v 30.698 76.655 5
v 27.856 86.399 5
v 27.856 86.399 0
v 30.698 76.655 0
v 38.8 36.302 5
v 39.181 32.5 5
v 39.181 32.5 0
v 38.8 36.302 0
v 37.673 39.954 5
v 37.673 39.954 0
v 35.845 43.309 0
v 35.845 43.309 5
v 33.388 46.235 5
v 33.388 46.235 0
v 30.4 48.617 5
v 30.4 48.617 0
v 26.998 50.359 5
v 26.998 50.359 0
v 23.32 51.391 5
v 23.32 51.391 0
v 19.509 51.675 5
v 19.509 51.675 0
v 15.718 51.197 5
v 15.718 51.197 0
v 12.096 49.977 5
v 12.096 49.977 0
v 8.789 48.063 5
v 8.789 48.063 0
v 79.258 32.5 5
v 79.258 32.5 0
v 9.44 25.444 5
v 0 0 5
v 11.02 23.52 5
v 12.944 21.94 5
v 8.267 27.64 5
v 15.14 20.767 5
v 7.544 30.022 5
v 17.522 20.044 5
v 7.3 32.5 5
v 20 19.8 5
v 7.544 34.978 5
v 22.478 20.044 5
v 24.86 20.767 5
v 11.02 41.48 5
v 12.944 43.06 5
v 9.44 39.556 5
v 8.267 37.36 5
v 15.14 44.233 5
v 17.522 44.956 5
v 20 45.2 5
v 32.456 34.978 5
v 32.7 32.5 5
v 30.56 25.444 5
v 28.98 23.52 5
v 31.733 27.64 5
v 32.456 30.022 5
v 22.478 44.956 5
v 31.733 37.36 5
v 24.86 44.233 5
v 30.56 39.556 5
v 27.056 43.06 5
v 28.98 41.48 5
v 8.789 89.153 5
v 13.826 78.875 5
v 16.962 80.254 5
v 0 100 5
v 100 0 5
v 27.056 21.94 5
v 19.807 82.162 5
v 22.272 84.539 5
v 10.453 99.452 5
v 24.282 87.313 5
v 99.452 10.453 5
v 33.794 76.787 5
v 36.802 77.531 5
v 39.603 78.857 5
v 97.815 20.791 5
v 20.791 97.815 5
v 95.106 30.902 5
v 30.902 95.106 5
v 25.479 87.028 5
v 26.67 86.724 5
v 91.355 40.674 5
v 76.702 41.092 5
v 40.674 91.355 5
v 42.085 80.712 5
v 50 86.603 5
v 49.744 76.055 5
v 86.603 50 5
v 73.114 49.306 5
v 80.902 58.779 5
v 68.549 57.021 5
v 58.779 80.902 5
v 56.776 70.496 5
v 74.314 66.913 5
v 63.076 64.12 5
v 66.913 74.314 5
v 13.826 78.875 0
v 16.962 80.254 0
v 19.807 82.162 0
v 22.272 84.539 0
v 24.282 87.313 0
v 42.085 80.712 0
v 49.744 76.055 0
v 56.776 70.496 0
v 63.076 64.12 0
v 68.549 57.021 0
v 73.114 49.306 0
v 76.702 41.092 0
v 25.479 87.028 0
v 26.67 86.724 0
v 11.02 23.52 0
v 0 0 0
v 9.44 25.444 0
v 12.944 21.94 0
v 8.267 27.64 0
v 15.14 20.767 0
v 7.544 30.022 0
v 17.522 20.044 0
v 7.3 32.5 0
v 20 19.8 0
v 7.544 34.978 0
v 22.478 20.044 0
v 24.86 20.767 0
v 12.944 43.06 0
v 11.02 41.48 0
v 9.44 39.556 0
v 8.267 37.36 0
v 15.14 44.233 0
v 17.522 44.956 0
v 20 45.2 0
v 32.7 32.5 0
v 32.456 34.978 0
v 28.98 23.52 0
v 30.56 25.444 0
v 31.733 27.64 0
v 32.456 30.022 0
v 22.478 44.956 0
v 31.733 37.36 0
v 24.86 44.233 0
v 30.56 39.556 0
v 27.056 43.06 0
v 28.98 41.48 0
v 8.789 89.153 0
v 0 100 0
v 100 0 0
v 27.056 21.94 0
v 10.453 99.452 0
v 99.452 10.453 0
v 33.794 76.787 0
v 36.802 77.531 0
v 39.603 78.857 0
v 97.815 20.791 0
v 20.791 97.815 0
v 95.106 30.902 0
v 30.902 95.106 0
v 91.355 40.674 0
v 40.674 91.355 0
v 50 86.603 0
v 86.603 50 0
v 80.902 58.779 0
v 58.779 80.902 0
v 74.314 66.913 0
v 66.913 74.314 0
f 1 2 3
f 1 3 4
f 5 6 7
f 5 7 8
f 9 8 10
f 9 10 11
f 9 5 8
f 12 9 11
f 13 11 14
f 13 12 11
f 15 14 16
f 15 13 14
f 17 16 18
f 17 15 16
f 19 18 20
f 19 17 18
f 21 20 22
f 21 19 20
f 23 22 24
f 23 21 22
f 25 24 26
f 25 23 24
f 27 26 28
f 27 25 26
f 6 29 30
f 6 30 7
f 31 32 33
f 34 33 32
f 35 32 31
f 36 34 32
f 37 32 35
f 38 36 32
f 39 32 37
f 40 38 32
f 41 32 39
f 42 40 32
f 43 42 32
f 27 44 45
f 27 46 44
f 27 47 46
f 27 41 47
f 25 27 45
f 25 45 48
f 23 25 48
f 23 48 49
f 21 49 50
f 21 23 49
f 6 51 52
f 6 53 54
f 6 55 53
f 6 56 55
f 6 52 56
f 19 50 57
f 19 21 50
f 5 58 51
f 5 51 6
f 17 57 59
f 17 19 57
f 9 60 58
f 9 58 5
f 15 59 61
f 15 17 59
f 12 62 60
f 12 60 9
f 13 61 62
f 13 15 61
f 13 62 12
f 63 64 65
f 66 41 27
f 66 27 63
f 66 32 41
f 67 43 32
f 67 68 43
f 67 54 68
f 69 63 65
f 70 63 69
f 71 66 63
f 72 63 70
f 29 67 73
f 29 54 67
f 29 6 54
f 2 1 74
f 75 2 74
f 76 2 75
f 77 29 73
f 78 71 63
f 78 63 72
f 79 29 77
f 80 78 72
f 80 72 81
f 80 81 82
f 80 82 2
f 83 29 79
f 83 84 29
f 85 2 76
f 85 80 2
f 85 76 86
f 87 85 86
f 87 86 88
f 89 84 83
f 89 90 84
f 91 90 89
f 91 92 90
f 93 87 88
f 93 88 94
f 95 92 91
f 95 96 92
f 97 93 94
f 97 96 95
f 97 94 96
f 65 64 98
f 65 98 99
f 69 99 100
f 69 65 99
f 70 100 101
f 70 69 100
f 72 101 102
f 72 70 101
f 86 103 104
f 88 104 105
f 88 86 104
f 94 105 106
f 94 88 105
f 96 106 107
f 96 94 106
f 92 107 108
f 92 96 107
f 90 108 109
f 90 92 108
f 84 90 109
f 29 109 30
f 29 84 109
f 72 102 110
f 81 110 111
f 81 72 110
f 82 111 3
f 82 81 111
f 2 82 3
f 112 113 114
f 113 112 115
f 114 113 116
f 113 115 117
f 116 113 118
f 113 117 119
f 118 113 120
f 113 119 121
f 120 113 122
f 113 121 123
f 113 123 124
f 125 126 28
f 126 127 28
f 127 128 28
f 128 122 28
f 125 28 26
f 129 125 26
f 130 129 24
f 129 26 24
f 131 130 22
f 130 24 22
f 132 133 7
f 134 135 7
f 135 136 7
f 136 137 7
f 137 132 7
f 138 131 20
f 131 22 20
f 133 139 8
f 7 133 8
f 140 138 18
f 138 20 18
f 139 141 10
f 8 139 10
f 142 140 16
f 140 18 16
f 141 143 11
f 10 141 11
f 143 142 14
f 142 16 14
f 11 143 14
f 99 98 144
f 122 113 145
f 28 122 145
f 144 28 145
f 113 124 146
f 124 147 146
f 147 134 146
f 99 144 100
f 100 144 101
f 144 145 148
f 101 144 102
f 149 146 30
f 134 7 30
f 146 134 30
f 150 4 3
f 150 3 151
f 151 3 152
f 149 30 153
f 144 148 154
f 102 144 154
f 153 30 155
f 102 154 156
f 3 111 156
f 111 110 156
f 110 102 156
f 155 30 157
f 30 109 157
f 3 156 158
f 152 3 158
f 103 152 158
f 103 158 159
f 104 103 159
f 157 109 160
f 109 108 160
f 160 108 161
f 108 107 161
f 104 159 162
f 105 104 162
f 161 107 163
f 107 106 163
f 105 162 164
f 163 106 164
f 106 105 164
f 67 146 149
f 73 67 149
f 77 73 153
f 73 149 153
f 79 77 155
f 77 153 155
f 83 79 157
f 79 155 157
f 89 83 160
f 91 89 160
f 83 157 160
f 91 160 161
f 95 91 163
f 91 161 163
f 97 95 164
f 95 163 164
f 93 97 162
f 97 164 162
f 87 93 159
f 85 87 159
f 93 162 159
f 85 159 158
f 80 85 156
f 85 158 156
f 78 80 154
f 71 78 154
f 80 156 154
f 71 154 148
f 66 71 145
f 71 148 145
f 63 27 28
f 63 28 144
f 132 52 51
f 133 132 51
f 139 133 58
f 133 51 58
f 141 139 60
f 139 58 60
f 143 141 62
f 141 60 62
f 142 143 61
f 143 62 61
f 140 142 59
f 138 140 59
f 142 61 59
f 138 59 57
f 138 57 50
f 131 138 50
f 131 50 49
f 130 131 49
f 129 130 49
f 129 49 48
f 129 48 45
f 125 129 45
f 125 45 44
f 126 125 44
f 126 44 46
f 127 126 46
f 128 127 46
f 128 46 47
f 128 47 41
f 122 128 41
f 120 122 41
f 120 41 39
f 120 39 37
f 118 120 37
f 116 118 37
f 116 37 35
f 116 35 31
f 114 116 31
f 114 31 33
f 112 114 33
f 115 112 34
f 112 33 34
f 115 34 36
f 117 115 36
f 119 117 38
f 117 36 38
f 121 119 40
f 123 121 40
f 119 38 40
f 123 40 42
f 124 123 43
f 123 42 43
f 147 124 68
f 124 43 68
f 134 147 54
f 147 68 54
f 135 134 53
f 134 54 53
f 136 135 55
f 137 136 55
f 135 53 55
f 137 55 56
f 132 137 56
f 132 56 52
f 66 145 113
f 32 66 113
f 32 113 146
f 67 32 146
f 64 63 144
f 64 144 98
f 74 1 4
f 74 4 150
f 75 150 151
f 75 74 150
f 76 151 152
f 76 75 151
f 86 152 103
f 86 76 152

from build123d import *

# Parameters (mm, degrees)
SALIENTE_EXTRUIR1_DEPTH = 5
CROQUIS2_R              = 12.7
CORTAR_EXTRUIR1_DEPTH   = 10
CORTAR_EXTRUIR2_DEPTH   = 10


with BuildPart() as part:
    # Croquis1 → Saliente-Extruir1 (new body)
    with BuildSketch(Plane.XY):
        with BuildLine():
            Line((0, 100), (0, 0))
            Line((0, 0), (100, 0))
            ThreePointArc((100, 0), (70.710678119, 70.710678119), (0, 100))
        make_face()
    extrude(amount=SALIENTE_EXTRUIR1_DEPTH)

    # Croquis2 → Cortar-Extruir1 (cut)
    with BuildSketch(Plane.XY.offset(5)):
        with Locations((20, 32.5)):
            Circle(CROQUIS2_R)
    extrude(amount=-CORTAR_EXTRUIR1_DEPTH, mode=Mode.SUBTRACT)

    # Croquis3 → Cortar-Extruir2 (cut)
    with BuildSketch(Plane.XY.offset(5)):
        with BuildLine():
            Line((8.78881249, 48.063247001), (8.78881249, 89.15262579))
            Line((8.78881249, 89.15262579), (13.826190337, 78.875233565))
            ThreePointArc((13.826190337, 78.875233565), (19.806584532, 82.16151857), (24.282169152, 87.312627788))
            ThreePointArc((24.282169152, 87.312627788), (26.07485748, 86.878519508), (27.856038853, 86.399380324))
            Line((27.856038853, 86.399380324), (30.697722068, 76.655190323))
            ThreePointArc((30.697722068, 76.655190323), (36.801955218, 77.531012101), (42.084756772, 80.712322191))
            ThreePointArc((42.084756772, 80.712322191), (65.921457687, 60.654047665), (79.258334665, 32.5))
            Line((79.258334665, 32.5), (39.180859798, 32.5))
            ThreePointArc((39.180859798, 32.5), (28.742573042, 49.572574475), (8.78881249, 48.063247001))
        make_face()
    extrude(amount=-CORTAR_EXTRUIR2_DEPTH, mode=Mode.SUBTRACT)


solid = part.part
